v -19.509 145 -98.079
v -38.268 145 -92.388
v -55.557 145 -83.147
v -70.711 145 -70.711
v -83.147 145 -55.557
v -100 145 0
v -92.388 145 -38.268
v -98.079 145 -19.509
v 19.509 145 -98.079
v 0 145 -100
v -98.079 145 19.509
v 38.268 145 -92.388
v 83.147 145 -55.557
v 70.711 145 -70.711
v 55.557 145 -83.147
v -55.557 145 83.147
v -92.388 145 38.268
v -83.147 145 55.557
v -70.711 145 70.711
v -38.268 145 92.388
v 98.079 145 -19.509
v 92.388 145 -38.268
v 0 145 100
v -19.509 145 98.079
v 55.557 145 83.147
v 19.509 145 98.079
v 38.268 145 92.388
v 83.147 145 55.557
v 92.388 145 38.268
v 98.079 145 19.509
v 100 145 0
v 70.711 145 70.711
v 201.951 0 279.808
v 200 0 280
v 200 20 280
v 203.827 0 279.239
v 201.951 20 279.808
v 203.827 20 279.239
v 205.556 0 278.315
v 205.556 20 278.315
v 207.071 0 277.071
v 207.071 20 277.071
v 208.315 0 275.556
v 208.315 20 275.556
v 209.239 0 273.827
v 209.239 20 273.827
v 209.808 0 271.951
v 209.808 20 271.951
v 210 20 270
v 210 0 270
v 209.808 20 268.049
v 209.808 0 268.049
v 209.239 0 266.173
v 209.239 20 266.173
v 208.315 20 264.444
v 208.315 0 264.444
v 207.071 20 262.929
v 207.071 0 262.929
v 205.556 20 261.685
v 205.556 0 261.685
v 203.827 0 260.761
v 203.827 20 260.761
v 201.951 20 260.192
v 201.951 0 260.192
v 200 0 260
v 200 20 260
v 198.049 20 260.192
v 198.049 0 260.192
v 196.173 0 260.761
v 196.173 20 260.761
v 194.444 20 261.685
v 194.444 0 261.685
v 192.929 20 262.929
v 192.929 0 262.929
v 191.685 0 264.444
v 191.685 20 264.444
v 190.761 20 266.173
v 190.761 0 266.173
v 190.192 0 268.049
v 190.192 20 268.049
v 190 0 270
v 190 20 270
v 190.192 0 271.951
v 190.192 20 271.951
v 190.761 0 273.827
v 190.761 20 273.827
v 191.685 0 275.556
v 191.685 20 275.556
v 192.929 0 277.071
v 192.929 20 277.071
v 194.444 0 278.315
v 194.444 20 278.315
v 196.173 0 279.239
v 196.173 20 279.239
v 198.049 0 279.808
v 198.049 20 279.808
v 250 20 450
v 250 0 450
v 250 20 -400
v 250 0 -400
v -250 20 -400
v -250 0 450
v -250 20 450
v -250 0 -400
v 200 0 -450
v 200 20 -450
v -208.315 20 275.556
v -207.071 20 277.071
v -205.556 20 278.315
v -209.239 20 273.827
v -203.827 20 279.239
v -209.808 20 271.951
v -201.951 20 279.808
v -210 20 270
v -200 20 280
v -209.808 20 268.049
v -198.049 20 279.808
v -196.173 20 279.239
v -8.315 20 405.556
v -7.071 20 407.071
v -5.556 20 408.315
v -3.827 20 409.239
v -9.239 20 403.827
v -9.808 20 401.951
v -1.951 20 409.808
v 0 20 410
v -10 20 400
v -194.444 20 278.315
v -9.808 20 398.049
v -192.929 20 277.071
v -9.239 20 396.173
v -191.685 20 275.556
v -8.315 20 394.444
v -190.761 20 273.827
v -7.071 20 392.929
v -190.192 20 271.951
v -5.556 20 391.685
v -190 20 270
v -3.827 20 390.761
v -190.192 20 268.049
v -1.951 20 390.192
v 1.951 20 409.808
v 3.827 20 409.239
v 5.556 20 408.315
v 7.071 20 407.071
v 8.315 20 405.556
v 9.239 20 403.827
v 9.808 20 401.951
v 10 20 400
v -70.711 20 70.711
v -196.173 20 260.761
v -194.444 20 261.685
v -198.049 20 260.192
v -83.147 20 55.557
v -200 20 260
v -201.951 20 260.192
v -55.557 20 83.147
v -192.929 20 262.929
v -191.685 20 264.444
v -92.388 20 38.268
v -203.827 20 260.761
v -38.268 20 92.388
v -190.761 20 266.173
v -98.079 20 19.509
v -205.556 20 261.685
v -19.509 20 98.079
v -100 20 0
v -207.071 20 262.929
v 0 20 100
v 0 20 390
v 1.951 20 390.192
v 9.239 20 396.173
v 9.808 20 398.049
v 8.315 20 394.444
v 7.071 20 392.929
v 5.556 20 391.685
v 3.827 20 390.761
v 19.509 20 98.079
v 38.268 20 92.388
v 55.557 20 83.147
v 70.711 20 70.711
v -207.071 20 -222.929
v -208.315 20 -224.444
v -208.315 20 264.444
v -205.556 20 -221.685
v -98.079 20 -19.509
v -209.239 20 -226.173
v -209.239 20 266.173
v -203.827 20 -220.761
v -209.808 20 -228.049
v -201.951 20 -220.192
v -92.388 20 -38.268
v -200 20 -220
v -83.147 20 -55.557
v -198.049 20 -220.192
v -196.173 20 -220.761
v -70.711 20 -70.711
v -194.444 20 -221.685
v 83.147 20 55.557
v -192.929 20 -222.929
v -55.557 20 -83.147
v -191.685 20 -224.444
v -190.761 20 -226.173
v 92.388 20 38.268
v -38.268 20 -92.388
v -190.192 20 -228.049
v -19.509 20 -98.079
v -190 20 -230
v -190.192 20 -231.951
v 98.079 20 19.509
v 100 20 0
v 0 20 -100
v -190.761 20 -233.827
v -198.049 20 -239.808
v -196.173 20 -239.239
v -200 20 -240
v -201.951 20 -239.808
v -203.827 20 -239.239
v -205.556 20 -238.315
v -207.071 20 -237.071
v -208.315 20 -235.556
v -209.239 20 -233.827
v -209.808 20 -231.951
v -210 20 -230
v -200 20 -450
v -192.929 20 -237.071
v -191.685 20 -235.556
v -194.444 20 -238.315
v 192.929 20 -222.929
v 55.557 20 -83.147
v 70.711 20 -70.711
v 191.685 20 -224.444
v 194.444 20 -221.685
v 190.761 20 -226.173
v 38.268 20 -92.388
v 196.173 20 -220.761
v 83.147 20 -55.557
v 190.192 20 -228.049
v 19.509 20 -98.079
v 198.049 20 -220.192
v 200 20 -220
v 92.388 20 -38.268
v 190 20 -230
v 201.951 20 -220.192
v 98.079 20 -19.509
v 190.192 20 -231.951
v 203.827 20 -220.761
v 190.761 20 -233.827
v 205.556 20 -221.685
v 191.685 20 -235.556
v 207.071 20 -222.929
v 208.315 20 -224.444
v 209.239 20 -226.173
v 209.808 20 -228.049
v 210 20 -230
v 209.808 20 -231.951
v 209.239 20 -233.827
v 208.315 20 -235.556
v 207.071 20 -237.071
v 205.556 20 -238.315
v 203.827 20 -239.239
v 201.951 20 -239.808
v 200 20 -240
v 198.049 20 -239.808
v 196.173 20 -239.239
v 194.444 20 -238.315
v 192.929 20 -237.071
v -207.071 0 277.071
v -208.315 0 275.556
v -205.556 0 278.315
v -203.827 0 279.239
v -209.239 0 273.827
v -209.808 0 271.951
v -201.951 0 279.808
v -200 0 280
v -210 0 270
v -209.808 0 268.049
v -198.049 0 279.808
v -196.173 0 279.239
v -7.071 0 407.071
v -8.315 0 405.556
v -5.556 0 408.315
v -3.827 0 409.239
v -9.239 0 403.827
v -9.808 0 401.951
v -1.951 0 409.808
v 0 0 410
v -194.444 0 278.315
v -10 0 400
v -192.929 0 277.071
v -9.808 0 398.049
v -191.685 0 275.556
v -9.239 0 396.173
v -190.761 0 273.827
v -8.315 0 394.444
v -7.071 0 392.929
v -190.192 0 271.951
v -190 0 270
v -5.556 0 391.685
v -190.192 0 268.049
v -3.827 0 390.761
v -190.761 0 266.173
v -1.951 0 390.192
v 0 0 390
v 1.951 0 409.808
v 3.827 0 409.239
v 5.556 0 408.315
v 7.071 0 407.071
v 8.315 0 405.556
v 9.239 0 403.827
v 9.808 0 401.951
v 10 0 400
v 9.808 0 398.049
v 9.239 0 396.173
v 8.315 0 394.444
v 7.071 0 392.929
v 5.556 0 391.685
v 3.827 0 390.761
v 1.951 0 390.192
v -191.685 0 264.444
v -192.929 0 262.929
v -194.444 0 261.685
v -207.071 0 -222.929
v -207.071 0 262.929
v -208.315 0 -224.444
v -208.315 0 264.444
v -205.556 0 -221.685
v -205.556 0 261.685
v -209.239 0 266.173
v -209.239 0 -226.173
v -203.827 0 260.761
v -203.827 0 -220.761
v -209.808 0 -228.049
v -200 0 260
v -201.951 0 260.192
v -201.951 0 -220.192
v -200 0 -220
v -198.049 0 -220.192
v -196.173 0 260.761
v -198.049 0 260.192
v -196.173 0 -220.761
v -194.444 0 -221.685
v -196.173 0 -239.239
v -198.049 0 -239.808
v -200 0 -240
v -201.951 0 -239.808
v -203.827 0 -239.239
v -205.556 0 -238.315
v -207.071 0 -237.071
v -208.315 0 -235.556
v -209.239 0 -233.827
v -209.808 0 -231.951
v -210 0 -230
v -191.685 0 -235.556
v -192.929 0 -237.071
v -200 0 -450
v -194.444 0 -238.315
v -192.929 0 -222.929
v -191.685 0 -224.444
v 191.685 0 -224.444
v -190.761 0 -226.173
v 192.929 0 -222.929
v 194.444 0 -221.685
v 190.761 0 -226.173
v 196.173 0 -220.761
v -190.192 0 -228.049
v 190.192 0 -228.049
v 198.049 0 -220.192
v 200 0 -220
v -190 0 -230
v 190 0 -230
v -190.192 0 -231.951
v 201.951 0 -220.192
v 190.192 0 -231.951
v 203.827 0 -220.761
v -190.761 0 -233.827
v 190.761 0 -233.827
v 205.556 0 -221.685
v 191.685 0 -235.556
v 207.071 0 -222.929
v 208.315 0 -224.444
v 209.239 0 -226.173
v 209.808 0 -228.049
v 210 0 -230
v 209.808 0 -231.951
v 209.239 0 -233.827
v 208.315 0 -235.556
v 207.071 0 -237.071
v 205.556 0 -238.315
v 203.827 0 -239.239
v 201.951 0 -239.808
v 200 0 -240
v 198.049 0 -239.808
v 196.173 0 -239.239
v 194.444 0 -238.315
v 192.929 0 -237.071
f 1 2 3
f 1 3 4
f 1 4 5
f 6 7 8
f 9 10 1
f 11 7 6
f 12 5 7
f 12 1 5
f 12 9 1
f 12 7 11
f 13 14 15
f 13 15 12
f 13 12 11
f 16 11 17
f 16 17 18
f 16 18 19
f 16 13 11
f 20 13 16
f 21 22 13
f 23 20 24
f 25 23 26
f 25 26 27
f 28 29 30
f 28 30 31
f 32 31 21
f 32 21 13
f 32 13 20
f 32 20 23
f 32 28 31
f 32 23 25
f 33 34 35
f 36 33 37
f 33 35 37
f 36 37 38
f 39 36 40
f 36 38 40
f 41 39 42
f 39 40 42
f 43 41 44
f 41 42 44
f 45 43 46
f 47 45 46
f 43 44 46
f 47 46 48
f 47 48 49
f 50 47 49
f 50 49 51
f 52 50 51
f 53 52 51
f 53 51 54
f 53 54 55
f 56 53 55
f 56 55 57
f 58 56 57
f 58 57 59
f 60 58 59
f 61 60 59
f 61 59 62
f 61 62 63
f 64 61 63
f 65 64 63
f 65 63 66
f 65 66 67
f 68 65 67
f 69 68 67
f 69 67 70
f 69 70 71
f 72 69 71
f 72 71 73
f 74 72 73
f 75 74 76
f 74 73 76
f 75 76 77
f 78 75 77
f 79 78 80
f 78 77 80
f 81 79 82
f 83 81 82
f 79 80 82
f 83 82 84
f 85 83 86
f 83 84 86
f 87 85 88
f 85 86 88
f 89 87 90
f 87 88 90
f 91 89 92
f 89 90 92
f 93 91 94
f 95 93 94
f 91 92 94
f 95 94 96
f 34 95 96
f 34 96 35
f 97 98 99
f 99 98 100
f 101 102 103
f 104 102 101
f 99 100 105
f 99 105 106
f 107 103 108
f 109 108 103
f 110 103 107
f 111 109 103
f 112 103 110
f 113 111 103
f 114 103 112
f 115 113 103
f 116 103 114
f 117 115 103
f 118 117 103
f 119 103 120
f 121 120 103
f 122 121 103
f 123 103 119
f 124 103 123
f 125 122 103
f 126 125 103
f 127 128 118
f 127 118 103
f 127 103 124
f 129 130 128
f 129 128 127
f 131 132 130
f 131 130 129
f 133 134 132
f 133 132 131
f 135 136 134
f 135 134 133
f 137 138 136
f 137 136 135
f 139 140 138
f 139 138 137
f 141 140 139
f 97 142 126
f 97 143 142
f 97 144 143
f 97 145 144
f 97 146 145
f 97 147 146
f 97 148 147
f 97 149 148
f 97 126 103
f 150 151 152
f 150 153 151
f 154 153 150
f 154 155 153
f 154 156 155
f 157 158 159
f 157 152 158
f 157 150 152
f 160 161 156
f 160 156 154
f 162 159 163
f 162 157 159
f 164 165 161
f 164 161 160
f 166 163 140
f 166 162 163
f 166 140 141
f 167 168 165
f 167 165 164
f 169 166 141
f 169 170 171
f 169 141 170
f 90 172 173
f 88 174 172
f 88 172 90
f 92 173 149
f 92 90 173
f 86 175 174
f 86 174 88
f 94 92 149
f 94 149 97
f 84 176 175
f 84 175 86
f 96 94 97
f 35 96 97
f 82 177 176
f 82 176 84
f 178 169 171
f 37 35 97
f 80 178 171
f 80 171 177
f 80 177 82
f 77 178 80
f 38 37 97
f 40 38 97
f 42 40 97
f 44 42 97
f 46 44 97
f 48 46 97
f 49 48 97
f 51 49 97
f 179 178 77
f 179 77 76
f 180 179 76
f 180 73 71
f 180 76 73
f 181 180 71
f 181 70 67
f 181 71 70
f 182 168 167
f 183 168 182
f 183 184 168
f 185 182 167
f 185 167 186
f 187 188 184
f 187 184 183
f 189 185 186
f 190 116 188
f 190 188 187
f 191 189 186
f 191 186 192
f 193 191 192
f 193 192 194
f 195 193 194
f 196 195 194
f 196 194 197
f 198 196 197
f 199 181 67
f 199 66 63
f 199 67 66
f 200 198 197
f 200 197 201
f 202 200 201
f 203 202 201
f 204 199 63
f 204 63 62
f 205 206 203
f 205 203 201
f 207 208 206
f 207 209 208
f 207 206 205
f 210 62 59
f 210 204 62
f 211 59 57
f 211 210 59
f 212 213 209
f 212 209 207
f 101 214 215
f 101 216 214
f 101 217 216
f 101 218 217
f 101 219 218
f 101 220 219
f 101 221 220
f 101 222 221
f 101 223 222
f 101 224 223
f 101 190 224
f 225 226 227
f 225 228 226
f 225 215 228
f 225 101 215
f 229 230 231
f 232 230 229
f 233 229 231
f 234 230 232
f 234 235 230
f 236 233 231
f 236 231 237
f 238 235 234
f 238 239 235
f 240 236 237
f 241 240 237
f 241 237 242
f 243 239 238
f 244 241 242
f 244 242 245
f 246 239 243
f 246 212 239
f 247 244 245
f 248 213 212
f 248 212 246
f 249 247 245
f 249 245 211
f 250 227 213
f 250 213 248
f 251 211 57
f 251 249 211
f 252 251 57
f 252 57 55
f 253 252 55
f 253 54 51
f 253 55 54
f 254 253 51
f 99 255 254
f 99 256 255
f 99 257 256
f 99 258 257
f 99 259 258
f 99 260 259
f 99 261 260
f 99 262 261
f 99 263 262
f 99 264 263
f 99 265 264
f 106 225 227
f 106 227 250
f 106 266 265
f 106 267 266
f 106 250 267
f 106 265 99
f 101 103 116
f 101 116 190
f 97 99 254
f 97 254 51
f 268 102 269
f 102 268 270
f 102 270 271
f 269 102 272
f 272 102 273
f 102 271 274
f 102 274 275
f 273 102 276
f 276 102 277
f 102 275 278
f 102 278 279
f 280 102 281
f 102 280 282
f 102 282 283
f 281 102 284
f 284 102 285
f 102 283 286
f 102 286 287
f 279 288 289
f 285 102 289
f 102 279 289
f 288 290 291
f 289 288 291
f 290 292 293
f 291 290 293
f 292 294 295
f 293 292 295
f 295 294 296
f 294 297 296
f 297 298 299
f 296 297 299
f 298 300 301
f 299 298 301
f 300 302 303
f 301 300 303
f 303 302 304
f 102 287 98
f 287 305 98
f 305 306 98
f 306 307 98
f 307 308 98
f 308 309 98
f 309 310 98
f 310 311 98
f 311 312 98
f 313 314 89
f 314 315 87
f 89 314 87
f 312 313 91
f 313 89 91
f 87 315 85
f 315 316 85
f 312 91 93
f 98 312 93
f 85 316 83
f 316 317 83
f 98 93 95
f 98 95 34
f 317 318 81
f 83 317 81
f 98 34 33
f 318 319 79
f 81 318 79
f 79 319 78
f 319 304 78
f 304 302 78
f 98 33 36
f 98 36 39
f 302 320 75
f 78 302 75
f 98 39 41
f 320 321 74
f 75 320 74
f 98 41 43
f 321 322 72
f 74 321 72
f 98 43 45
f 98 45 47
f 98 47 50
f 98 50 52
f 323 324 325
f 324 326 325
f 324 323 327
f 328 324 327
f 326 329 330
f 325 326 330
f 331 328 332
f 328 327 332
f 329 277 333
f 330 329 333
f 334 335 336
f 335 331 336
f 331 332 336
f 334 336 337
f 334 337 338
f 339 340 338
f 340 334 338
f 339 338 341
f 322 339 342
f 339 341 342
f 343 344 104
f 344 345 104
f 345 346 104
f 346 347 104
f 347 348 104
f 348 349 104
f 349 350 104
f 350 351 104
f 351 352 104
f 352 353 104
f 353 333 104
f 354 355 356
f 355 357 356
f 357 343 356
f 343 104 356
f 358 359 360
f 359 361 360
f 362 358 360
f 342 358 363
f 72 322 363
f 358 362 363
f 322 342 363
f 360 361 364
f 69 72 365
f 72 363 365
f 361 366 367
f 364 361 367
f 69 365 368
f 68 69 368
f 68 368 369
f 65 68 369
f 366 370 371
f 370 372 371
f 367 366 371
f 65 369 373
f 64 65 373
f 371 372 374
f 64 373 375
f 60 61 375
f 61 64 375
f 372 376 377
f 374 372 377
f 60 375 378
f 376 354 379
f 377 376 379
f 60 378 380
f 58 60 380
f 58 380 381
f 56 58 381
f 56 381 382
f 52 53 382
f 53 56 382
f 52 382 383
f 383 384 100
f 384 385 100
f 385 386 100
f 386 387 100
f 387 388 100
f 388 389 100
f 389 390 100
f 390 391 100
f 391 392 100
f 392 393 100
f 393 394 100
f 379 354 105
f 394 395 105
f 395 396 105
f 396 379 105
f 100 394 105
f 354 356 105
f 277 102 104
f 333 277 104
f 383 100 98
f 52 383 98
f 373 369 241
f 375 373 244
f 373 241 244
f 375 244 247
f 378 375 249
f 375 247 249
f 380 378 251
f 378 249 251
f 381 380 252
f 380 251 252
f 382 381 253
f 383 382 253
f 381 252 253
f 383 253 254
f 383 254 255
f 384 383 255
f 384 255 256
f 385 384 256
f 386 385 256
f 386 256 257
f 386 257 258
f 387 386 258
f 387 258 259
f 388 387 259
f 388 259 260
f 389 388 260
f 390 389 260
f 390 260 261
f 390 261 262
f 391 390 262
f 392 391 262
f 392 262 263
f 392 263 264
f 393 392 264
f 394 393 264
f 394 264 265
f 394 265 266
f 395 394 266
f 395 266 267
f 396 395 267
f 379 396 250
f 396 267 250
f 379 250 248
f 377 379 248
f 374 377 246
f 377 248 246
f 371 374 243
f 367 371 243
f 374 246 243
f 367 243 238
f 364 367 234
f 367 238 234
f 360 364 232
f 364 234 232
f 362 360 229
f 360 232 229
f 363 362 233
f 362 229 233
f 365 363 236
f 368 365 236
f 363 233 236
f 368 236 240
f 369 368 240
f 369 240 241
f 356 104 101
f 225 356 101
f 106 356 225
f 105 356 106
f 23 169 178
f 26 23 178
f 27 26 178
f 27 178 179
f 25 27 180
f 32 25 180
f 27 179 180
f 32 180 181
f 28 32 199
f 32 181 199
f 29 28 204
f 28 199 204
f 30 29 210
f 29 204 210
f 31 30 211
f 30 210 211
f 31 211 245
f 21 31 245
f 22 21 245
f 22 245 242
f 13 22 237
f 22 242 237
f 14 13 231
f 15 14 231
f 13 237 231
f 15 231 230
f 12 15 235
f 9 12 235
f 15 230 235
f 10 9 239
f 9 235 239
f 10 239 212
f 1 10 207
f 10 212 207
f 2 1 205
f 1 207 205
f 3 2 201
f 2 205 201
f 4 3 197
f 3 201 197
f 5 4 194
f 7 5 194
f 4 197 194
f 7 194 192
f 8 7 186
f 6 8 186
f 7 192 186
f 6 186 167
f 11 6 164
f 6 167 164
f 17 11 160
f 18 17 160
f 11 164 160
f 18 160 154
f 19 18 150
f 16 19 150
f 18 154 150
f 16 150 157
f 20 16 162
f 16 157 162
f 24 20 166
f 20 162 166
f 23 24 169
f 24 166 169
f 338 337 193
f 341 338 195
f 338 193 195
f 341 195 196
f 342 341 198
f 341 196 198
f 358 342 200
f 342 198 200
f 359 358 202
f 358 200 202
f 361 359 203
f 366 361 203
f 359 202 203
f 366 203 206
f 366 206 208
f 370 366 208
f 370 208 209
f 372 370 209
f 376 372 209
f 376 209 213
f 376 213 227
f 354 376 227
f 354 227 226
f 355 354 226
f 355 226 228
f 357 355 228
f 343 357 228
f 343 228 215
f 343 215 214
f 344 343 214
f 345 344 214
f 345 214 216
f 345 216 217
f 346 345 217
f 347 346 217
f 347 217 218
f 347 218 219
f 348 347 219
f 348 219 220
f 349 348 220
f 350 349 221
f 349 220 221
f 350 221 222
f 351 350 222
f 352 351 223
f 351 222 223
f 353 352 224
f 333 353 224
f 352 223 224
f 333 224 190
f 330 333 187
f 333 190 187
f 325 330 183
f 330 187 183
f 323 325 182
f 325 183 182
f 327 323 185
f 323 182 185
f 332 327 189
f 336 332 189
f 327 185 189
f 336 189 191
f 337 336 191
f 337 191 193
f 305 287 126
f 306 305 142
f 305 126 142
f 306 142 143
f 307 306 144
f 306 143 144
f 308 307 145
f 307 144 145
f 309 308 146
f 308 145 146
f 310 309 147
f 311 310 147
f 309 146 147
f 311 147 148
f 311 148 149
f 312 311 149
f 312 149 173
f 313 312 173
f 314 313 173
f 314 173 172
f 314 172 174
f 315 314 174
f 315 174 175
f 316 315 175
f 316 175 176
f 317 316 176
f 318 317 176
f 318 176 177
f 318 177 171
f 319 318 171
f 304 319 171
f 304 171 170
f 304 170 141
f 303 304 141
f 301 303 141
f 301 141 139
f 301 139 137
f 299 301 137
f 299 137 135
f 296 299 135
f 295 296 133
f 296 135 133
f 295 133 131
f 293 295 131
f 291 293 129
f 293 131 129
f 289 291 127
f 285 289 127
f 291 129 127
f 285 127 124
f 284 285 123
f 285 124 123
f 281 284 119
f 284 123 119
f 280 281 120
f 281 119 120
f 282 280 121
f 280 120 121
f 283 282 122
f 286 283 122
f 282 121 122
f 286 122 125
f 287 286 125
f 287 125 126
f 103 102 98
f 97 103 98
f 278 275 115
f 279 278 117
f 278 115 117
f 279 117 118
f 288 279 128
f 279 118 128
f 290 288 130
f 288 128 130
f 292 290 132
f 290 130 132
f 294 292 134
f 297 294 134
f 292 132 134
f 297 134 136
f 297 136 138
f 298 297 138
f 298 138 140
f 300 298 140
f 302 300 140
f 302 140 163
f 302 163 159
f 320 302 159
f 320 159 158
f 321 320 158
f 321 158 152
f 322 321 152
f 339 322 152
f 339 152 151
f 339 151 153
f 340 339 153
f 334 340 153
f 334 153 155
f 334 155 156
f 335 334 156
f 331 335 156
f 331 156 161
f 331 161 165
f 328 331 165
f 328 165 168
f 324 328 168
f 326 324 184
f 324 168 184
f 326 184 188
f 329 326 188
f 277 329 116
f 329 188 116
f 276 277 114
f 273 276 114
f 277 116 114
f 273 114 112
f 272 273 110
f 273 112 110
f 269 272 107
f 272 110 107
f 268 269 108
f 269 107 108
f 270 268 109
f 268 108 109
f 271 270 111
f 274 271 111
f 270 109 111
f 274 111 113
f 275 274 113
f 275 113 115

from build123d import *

# Parameters (mm, degrees)
SKETCH1_W           = 500
SKETCH1_H           = 900
BOSS_EXTRUDE1_DEPTH = 20
CHAMFER1_SIZE       = 50
SKETCH2_R           = 10
CUT_EXTRUDE1_DEPTH  = 516.169874896
SKETCH3_R           = 100
BOSS_EXTRUDE2_DEPTH = 125
SKETCH4_R           = 10
CUT_EXTRUDE2_DEPTH  = 530.74050251


with BuildPart() as part:
    # Sketch1 → Boss-Extrude1 (new body)
    with BuildSketch(Plane(origin=(0, 0, 0), x_dir=(1, 0, 0), z_dir=(0, 1, 0))):
        Rectangle(SKETCH1_W, SKETCH1_H)
    extrude(amount=BOSS_EXTRUDE1_DEPTH)

    # Chamfer1
    chamfer1_edges = [part.edges().sort_by_distance(p)[0] for p in [
        (-250, 10, -450),
        (250, 10, -450),
    ]]
    chamfer(chamfer1_edges, length=CHAMFER1_SIZE)

    # Sketch2 → Cut-Extrude1 (cut, through all)
    with BuildSketch(Plane(origin=(0, 20, 0), x_dir=(1, 0, 0), z_dir=(0, 1, 0))):
        with Locations(Location((200, 230, 0), (0, 0, 270))):
            Circle(SKETCH2_R)
        with Locations(Location((-200, 230, 0), (0, 0, 270))):
            Circle(SKETCH2_R)
        with Locations(Location((200, -270, 0), (0, 0, 270))):
            Circle(SKETCH2_R)
        with Locations(Location((-200, -270, 0), (0, 0, 270))):
            Circle(SKETCH2_R)
    extrude(amount=-CUT_EXTRUDE1_DEPTH, mode=Mode.SUBTRACT)

    # Sketch3 → Boss-Extrude2 (add)
    with BuildSketch(Plane(origin=(0, 20, 0), x_dir=(1, 0, 0), z_dir=(0, 1, 0))):
        with Locations(Location((0, 0, 0), (0, 0, 270))):
            Circle(SKETCH3_R)
    extrude(amount=BOSS_EXTRUDE2_DEPTH)

    # Sketch4 → Cut-Extrude2 (cut, through all)
    with BuildSketch(Plane(origin=(0, 20, 0), x_dir=(1, 0, 0), z_dir=(0, 1, 0))):
        with Locations(Location((0, -400, 0), (0, 0, 270))):
            Circle(SKETCH4_R)
    extrude(amount=-CUT_EXTRUDE2_DEPTH, mode=Mode.SUBTRACT)


solid = part.part
